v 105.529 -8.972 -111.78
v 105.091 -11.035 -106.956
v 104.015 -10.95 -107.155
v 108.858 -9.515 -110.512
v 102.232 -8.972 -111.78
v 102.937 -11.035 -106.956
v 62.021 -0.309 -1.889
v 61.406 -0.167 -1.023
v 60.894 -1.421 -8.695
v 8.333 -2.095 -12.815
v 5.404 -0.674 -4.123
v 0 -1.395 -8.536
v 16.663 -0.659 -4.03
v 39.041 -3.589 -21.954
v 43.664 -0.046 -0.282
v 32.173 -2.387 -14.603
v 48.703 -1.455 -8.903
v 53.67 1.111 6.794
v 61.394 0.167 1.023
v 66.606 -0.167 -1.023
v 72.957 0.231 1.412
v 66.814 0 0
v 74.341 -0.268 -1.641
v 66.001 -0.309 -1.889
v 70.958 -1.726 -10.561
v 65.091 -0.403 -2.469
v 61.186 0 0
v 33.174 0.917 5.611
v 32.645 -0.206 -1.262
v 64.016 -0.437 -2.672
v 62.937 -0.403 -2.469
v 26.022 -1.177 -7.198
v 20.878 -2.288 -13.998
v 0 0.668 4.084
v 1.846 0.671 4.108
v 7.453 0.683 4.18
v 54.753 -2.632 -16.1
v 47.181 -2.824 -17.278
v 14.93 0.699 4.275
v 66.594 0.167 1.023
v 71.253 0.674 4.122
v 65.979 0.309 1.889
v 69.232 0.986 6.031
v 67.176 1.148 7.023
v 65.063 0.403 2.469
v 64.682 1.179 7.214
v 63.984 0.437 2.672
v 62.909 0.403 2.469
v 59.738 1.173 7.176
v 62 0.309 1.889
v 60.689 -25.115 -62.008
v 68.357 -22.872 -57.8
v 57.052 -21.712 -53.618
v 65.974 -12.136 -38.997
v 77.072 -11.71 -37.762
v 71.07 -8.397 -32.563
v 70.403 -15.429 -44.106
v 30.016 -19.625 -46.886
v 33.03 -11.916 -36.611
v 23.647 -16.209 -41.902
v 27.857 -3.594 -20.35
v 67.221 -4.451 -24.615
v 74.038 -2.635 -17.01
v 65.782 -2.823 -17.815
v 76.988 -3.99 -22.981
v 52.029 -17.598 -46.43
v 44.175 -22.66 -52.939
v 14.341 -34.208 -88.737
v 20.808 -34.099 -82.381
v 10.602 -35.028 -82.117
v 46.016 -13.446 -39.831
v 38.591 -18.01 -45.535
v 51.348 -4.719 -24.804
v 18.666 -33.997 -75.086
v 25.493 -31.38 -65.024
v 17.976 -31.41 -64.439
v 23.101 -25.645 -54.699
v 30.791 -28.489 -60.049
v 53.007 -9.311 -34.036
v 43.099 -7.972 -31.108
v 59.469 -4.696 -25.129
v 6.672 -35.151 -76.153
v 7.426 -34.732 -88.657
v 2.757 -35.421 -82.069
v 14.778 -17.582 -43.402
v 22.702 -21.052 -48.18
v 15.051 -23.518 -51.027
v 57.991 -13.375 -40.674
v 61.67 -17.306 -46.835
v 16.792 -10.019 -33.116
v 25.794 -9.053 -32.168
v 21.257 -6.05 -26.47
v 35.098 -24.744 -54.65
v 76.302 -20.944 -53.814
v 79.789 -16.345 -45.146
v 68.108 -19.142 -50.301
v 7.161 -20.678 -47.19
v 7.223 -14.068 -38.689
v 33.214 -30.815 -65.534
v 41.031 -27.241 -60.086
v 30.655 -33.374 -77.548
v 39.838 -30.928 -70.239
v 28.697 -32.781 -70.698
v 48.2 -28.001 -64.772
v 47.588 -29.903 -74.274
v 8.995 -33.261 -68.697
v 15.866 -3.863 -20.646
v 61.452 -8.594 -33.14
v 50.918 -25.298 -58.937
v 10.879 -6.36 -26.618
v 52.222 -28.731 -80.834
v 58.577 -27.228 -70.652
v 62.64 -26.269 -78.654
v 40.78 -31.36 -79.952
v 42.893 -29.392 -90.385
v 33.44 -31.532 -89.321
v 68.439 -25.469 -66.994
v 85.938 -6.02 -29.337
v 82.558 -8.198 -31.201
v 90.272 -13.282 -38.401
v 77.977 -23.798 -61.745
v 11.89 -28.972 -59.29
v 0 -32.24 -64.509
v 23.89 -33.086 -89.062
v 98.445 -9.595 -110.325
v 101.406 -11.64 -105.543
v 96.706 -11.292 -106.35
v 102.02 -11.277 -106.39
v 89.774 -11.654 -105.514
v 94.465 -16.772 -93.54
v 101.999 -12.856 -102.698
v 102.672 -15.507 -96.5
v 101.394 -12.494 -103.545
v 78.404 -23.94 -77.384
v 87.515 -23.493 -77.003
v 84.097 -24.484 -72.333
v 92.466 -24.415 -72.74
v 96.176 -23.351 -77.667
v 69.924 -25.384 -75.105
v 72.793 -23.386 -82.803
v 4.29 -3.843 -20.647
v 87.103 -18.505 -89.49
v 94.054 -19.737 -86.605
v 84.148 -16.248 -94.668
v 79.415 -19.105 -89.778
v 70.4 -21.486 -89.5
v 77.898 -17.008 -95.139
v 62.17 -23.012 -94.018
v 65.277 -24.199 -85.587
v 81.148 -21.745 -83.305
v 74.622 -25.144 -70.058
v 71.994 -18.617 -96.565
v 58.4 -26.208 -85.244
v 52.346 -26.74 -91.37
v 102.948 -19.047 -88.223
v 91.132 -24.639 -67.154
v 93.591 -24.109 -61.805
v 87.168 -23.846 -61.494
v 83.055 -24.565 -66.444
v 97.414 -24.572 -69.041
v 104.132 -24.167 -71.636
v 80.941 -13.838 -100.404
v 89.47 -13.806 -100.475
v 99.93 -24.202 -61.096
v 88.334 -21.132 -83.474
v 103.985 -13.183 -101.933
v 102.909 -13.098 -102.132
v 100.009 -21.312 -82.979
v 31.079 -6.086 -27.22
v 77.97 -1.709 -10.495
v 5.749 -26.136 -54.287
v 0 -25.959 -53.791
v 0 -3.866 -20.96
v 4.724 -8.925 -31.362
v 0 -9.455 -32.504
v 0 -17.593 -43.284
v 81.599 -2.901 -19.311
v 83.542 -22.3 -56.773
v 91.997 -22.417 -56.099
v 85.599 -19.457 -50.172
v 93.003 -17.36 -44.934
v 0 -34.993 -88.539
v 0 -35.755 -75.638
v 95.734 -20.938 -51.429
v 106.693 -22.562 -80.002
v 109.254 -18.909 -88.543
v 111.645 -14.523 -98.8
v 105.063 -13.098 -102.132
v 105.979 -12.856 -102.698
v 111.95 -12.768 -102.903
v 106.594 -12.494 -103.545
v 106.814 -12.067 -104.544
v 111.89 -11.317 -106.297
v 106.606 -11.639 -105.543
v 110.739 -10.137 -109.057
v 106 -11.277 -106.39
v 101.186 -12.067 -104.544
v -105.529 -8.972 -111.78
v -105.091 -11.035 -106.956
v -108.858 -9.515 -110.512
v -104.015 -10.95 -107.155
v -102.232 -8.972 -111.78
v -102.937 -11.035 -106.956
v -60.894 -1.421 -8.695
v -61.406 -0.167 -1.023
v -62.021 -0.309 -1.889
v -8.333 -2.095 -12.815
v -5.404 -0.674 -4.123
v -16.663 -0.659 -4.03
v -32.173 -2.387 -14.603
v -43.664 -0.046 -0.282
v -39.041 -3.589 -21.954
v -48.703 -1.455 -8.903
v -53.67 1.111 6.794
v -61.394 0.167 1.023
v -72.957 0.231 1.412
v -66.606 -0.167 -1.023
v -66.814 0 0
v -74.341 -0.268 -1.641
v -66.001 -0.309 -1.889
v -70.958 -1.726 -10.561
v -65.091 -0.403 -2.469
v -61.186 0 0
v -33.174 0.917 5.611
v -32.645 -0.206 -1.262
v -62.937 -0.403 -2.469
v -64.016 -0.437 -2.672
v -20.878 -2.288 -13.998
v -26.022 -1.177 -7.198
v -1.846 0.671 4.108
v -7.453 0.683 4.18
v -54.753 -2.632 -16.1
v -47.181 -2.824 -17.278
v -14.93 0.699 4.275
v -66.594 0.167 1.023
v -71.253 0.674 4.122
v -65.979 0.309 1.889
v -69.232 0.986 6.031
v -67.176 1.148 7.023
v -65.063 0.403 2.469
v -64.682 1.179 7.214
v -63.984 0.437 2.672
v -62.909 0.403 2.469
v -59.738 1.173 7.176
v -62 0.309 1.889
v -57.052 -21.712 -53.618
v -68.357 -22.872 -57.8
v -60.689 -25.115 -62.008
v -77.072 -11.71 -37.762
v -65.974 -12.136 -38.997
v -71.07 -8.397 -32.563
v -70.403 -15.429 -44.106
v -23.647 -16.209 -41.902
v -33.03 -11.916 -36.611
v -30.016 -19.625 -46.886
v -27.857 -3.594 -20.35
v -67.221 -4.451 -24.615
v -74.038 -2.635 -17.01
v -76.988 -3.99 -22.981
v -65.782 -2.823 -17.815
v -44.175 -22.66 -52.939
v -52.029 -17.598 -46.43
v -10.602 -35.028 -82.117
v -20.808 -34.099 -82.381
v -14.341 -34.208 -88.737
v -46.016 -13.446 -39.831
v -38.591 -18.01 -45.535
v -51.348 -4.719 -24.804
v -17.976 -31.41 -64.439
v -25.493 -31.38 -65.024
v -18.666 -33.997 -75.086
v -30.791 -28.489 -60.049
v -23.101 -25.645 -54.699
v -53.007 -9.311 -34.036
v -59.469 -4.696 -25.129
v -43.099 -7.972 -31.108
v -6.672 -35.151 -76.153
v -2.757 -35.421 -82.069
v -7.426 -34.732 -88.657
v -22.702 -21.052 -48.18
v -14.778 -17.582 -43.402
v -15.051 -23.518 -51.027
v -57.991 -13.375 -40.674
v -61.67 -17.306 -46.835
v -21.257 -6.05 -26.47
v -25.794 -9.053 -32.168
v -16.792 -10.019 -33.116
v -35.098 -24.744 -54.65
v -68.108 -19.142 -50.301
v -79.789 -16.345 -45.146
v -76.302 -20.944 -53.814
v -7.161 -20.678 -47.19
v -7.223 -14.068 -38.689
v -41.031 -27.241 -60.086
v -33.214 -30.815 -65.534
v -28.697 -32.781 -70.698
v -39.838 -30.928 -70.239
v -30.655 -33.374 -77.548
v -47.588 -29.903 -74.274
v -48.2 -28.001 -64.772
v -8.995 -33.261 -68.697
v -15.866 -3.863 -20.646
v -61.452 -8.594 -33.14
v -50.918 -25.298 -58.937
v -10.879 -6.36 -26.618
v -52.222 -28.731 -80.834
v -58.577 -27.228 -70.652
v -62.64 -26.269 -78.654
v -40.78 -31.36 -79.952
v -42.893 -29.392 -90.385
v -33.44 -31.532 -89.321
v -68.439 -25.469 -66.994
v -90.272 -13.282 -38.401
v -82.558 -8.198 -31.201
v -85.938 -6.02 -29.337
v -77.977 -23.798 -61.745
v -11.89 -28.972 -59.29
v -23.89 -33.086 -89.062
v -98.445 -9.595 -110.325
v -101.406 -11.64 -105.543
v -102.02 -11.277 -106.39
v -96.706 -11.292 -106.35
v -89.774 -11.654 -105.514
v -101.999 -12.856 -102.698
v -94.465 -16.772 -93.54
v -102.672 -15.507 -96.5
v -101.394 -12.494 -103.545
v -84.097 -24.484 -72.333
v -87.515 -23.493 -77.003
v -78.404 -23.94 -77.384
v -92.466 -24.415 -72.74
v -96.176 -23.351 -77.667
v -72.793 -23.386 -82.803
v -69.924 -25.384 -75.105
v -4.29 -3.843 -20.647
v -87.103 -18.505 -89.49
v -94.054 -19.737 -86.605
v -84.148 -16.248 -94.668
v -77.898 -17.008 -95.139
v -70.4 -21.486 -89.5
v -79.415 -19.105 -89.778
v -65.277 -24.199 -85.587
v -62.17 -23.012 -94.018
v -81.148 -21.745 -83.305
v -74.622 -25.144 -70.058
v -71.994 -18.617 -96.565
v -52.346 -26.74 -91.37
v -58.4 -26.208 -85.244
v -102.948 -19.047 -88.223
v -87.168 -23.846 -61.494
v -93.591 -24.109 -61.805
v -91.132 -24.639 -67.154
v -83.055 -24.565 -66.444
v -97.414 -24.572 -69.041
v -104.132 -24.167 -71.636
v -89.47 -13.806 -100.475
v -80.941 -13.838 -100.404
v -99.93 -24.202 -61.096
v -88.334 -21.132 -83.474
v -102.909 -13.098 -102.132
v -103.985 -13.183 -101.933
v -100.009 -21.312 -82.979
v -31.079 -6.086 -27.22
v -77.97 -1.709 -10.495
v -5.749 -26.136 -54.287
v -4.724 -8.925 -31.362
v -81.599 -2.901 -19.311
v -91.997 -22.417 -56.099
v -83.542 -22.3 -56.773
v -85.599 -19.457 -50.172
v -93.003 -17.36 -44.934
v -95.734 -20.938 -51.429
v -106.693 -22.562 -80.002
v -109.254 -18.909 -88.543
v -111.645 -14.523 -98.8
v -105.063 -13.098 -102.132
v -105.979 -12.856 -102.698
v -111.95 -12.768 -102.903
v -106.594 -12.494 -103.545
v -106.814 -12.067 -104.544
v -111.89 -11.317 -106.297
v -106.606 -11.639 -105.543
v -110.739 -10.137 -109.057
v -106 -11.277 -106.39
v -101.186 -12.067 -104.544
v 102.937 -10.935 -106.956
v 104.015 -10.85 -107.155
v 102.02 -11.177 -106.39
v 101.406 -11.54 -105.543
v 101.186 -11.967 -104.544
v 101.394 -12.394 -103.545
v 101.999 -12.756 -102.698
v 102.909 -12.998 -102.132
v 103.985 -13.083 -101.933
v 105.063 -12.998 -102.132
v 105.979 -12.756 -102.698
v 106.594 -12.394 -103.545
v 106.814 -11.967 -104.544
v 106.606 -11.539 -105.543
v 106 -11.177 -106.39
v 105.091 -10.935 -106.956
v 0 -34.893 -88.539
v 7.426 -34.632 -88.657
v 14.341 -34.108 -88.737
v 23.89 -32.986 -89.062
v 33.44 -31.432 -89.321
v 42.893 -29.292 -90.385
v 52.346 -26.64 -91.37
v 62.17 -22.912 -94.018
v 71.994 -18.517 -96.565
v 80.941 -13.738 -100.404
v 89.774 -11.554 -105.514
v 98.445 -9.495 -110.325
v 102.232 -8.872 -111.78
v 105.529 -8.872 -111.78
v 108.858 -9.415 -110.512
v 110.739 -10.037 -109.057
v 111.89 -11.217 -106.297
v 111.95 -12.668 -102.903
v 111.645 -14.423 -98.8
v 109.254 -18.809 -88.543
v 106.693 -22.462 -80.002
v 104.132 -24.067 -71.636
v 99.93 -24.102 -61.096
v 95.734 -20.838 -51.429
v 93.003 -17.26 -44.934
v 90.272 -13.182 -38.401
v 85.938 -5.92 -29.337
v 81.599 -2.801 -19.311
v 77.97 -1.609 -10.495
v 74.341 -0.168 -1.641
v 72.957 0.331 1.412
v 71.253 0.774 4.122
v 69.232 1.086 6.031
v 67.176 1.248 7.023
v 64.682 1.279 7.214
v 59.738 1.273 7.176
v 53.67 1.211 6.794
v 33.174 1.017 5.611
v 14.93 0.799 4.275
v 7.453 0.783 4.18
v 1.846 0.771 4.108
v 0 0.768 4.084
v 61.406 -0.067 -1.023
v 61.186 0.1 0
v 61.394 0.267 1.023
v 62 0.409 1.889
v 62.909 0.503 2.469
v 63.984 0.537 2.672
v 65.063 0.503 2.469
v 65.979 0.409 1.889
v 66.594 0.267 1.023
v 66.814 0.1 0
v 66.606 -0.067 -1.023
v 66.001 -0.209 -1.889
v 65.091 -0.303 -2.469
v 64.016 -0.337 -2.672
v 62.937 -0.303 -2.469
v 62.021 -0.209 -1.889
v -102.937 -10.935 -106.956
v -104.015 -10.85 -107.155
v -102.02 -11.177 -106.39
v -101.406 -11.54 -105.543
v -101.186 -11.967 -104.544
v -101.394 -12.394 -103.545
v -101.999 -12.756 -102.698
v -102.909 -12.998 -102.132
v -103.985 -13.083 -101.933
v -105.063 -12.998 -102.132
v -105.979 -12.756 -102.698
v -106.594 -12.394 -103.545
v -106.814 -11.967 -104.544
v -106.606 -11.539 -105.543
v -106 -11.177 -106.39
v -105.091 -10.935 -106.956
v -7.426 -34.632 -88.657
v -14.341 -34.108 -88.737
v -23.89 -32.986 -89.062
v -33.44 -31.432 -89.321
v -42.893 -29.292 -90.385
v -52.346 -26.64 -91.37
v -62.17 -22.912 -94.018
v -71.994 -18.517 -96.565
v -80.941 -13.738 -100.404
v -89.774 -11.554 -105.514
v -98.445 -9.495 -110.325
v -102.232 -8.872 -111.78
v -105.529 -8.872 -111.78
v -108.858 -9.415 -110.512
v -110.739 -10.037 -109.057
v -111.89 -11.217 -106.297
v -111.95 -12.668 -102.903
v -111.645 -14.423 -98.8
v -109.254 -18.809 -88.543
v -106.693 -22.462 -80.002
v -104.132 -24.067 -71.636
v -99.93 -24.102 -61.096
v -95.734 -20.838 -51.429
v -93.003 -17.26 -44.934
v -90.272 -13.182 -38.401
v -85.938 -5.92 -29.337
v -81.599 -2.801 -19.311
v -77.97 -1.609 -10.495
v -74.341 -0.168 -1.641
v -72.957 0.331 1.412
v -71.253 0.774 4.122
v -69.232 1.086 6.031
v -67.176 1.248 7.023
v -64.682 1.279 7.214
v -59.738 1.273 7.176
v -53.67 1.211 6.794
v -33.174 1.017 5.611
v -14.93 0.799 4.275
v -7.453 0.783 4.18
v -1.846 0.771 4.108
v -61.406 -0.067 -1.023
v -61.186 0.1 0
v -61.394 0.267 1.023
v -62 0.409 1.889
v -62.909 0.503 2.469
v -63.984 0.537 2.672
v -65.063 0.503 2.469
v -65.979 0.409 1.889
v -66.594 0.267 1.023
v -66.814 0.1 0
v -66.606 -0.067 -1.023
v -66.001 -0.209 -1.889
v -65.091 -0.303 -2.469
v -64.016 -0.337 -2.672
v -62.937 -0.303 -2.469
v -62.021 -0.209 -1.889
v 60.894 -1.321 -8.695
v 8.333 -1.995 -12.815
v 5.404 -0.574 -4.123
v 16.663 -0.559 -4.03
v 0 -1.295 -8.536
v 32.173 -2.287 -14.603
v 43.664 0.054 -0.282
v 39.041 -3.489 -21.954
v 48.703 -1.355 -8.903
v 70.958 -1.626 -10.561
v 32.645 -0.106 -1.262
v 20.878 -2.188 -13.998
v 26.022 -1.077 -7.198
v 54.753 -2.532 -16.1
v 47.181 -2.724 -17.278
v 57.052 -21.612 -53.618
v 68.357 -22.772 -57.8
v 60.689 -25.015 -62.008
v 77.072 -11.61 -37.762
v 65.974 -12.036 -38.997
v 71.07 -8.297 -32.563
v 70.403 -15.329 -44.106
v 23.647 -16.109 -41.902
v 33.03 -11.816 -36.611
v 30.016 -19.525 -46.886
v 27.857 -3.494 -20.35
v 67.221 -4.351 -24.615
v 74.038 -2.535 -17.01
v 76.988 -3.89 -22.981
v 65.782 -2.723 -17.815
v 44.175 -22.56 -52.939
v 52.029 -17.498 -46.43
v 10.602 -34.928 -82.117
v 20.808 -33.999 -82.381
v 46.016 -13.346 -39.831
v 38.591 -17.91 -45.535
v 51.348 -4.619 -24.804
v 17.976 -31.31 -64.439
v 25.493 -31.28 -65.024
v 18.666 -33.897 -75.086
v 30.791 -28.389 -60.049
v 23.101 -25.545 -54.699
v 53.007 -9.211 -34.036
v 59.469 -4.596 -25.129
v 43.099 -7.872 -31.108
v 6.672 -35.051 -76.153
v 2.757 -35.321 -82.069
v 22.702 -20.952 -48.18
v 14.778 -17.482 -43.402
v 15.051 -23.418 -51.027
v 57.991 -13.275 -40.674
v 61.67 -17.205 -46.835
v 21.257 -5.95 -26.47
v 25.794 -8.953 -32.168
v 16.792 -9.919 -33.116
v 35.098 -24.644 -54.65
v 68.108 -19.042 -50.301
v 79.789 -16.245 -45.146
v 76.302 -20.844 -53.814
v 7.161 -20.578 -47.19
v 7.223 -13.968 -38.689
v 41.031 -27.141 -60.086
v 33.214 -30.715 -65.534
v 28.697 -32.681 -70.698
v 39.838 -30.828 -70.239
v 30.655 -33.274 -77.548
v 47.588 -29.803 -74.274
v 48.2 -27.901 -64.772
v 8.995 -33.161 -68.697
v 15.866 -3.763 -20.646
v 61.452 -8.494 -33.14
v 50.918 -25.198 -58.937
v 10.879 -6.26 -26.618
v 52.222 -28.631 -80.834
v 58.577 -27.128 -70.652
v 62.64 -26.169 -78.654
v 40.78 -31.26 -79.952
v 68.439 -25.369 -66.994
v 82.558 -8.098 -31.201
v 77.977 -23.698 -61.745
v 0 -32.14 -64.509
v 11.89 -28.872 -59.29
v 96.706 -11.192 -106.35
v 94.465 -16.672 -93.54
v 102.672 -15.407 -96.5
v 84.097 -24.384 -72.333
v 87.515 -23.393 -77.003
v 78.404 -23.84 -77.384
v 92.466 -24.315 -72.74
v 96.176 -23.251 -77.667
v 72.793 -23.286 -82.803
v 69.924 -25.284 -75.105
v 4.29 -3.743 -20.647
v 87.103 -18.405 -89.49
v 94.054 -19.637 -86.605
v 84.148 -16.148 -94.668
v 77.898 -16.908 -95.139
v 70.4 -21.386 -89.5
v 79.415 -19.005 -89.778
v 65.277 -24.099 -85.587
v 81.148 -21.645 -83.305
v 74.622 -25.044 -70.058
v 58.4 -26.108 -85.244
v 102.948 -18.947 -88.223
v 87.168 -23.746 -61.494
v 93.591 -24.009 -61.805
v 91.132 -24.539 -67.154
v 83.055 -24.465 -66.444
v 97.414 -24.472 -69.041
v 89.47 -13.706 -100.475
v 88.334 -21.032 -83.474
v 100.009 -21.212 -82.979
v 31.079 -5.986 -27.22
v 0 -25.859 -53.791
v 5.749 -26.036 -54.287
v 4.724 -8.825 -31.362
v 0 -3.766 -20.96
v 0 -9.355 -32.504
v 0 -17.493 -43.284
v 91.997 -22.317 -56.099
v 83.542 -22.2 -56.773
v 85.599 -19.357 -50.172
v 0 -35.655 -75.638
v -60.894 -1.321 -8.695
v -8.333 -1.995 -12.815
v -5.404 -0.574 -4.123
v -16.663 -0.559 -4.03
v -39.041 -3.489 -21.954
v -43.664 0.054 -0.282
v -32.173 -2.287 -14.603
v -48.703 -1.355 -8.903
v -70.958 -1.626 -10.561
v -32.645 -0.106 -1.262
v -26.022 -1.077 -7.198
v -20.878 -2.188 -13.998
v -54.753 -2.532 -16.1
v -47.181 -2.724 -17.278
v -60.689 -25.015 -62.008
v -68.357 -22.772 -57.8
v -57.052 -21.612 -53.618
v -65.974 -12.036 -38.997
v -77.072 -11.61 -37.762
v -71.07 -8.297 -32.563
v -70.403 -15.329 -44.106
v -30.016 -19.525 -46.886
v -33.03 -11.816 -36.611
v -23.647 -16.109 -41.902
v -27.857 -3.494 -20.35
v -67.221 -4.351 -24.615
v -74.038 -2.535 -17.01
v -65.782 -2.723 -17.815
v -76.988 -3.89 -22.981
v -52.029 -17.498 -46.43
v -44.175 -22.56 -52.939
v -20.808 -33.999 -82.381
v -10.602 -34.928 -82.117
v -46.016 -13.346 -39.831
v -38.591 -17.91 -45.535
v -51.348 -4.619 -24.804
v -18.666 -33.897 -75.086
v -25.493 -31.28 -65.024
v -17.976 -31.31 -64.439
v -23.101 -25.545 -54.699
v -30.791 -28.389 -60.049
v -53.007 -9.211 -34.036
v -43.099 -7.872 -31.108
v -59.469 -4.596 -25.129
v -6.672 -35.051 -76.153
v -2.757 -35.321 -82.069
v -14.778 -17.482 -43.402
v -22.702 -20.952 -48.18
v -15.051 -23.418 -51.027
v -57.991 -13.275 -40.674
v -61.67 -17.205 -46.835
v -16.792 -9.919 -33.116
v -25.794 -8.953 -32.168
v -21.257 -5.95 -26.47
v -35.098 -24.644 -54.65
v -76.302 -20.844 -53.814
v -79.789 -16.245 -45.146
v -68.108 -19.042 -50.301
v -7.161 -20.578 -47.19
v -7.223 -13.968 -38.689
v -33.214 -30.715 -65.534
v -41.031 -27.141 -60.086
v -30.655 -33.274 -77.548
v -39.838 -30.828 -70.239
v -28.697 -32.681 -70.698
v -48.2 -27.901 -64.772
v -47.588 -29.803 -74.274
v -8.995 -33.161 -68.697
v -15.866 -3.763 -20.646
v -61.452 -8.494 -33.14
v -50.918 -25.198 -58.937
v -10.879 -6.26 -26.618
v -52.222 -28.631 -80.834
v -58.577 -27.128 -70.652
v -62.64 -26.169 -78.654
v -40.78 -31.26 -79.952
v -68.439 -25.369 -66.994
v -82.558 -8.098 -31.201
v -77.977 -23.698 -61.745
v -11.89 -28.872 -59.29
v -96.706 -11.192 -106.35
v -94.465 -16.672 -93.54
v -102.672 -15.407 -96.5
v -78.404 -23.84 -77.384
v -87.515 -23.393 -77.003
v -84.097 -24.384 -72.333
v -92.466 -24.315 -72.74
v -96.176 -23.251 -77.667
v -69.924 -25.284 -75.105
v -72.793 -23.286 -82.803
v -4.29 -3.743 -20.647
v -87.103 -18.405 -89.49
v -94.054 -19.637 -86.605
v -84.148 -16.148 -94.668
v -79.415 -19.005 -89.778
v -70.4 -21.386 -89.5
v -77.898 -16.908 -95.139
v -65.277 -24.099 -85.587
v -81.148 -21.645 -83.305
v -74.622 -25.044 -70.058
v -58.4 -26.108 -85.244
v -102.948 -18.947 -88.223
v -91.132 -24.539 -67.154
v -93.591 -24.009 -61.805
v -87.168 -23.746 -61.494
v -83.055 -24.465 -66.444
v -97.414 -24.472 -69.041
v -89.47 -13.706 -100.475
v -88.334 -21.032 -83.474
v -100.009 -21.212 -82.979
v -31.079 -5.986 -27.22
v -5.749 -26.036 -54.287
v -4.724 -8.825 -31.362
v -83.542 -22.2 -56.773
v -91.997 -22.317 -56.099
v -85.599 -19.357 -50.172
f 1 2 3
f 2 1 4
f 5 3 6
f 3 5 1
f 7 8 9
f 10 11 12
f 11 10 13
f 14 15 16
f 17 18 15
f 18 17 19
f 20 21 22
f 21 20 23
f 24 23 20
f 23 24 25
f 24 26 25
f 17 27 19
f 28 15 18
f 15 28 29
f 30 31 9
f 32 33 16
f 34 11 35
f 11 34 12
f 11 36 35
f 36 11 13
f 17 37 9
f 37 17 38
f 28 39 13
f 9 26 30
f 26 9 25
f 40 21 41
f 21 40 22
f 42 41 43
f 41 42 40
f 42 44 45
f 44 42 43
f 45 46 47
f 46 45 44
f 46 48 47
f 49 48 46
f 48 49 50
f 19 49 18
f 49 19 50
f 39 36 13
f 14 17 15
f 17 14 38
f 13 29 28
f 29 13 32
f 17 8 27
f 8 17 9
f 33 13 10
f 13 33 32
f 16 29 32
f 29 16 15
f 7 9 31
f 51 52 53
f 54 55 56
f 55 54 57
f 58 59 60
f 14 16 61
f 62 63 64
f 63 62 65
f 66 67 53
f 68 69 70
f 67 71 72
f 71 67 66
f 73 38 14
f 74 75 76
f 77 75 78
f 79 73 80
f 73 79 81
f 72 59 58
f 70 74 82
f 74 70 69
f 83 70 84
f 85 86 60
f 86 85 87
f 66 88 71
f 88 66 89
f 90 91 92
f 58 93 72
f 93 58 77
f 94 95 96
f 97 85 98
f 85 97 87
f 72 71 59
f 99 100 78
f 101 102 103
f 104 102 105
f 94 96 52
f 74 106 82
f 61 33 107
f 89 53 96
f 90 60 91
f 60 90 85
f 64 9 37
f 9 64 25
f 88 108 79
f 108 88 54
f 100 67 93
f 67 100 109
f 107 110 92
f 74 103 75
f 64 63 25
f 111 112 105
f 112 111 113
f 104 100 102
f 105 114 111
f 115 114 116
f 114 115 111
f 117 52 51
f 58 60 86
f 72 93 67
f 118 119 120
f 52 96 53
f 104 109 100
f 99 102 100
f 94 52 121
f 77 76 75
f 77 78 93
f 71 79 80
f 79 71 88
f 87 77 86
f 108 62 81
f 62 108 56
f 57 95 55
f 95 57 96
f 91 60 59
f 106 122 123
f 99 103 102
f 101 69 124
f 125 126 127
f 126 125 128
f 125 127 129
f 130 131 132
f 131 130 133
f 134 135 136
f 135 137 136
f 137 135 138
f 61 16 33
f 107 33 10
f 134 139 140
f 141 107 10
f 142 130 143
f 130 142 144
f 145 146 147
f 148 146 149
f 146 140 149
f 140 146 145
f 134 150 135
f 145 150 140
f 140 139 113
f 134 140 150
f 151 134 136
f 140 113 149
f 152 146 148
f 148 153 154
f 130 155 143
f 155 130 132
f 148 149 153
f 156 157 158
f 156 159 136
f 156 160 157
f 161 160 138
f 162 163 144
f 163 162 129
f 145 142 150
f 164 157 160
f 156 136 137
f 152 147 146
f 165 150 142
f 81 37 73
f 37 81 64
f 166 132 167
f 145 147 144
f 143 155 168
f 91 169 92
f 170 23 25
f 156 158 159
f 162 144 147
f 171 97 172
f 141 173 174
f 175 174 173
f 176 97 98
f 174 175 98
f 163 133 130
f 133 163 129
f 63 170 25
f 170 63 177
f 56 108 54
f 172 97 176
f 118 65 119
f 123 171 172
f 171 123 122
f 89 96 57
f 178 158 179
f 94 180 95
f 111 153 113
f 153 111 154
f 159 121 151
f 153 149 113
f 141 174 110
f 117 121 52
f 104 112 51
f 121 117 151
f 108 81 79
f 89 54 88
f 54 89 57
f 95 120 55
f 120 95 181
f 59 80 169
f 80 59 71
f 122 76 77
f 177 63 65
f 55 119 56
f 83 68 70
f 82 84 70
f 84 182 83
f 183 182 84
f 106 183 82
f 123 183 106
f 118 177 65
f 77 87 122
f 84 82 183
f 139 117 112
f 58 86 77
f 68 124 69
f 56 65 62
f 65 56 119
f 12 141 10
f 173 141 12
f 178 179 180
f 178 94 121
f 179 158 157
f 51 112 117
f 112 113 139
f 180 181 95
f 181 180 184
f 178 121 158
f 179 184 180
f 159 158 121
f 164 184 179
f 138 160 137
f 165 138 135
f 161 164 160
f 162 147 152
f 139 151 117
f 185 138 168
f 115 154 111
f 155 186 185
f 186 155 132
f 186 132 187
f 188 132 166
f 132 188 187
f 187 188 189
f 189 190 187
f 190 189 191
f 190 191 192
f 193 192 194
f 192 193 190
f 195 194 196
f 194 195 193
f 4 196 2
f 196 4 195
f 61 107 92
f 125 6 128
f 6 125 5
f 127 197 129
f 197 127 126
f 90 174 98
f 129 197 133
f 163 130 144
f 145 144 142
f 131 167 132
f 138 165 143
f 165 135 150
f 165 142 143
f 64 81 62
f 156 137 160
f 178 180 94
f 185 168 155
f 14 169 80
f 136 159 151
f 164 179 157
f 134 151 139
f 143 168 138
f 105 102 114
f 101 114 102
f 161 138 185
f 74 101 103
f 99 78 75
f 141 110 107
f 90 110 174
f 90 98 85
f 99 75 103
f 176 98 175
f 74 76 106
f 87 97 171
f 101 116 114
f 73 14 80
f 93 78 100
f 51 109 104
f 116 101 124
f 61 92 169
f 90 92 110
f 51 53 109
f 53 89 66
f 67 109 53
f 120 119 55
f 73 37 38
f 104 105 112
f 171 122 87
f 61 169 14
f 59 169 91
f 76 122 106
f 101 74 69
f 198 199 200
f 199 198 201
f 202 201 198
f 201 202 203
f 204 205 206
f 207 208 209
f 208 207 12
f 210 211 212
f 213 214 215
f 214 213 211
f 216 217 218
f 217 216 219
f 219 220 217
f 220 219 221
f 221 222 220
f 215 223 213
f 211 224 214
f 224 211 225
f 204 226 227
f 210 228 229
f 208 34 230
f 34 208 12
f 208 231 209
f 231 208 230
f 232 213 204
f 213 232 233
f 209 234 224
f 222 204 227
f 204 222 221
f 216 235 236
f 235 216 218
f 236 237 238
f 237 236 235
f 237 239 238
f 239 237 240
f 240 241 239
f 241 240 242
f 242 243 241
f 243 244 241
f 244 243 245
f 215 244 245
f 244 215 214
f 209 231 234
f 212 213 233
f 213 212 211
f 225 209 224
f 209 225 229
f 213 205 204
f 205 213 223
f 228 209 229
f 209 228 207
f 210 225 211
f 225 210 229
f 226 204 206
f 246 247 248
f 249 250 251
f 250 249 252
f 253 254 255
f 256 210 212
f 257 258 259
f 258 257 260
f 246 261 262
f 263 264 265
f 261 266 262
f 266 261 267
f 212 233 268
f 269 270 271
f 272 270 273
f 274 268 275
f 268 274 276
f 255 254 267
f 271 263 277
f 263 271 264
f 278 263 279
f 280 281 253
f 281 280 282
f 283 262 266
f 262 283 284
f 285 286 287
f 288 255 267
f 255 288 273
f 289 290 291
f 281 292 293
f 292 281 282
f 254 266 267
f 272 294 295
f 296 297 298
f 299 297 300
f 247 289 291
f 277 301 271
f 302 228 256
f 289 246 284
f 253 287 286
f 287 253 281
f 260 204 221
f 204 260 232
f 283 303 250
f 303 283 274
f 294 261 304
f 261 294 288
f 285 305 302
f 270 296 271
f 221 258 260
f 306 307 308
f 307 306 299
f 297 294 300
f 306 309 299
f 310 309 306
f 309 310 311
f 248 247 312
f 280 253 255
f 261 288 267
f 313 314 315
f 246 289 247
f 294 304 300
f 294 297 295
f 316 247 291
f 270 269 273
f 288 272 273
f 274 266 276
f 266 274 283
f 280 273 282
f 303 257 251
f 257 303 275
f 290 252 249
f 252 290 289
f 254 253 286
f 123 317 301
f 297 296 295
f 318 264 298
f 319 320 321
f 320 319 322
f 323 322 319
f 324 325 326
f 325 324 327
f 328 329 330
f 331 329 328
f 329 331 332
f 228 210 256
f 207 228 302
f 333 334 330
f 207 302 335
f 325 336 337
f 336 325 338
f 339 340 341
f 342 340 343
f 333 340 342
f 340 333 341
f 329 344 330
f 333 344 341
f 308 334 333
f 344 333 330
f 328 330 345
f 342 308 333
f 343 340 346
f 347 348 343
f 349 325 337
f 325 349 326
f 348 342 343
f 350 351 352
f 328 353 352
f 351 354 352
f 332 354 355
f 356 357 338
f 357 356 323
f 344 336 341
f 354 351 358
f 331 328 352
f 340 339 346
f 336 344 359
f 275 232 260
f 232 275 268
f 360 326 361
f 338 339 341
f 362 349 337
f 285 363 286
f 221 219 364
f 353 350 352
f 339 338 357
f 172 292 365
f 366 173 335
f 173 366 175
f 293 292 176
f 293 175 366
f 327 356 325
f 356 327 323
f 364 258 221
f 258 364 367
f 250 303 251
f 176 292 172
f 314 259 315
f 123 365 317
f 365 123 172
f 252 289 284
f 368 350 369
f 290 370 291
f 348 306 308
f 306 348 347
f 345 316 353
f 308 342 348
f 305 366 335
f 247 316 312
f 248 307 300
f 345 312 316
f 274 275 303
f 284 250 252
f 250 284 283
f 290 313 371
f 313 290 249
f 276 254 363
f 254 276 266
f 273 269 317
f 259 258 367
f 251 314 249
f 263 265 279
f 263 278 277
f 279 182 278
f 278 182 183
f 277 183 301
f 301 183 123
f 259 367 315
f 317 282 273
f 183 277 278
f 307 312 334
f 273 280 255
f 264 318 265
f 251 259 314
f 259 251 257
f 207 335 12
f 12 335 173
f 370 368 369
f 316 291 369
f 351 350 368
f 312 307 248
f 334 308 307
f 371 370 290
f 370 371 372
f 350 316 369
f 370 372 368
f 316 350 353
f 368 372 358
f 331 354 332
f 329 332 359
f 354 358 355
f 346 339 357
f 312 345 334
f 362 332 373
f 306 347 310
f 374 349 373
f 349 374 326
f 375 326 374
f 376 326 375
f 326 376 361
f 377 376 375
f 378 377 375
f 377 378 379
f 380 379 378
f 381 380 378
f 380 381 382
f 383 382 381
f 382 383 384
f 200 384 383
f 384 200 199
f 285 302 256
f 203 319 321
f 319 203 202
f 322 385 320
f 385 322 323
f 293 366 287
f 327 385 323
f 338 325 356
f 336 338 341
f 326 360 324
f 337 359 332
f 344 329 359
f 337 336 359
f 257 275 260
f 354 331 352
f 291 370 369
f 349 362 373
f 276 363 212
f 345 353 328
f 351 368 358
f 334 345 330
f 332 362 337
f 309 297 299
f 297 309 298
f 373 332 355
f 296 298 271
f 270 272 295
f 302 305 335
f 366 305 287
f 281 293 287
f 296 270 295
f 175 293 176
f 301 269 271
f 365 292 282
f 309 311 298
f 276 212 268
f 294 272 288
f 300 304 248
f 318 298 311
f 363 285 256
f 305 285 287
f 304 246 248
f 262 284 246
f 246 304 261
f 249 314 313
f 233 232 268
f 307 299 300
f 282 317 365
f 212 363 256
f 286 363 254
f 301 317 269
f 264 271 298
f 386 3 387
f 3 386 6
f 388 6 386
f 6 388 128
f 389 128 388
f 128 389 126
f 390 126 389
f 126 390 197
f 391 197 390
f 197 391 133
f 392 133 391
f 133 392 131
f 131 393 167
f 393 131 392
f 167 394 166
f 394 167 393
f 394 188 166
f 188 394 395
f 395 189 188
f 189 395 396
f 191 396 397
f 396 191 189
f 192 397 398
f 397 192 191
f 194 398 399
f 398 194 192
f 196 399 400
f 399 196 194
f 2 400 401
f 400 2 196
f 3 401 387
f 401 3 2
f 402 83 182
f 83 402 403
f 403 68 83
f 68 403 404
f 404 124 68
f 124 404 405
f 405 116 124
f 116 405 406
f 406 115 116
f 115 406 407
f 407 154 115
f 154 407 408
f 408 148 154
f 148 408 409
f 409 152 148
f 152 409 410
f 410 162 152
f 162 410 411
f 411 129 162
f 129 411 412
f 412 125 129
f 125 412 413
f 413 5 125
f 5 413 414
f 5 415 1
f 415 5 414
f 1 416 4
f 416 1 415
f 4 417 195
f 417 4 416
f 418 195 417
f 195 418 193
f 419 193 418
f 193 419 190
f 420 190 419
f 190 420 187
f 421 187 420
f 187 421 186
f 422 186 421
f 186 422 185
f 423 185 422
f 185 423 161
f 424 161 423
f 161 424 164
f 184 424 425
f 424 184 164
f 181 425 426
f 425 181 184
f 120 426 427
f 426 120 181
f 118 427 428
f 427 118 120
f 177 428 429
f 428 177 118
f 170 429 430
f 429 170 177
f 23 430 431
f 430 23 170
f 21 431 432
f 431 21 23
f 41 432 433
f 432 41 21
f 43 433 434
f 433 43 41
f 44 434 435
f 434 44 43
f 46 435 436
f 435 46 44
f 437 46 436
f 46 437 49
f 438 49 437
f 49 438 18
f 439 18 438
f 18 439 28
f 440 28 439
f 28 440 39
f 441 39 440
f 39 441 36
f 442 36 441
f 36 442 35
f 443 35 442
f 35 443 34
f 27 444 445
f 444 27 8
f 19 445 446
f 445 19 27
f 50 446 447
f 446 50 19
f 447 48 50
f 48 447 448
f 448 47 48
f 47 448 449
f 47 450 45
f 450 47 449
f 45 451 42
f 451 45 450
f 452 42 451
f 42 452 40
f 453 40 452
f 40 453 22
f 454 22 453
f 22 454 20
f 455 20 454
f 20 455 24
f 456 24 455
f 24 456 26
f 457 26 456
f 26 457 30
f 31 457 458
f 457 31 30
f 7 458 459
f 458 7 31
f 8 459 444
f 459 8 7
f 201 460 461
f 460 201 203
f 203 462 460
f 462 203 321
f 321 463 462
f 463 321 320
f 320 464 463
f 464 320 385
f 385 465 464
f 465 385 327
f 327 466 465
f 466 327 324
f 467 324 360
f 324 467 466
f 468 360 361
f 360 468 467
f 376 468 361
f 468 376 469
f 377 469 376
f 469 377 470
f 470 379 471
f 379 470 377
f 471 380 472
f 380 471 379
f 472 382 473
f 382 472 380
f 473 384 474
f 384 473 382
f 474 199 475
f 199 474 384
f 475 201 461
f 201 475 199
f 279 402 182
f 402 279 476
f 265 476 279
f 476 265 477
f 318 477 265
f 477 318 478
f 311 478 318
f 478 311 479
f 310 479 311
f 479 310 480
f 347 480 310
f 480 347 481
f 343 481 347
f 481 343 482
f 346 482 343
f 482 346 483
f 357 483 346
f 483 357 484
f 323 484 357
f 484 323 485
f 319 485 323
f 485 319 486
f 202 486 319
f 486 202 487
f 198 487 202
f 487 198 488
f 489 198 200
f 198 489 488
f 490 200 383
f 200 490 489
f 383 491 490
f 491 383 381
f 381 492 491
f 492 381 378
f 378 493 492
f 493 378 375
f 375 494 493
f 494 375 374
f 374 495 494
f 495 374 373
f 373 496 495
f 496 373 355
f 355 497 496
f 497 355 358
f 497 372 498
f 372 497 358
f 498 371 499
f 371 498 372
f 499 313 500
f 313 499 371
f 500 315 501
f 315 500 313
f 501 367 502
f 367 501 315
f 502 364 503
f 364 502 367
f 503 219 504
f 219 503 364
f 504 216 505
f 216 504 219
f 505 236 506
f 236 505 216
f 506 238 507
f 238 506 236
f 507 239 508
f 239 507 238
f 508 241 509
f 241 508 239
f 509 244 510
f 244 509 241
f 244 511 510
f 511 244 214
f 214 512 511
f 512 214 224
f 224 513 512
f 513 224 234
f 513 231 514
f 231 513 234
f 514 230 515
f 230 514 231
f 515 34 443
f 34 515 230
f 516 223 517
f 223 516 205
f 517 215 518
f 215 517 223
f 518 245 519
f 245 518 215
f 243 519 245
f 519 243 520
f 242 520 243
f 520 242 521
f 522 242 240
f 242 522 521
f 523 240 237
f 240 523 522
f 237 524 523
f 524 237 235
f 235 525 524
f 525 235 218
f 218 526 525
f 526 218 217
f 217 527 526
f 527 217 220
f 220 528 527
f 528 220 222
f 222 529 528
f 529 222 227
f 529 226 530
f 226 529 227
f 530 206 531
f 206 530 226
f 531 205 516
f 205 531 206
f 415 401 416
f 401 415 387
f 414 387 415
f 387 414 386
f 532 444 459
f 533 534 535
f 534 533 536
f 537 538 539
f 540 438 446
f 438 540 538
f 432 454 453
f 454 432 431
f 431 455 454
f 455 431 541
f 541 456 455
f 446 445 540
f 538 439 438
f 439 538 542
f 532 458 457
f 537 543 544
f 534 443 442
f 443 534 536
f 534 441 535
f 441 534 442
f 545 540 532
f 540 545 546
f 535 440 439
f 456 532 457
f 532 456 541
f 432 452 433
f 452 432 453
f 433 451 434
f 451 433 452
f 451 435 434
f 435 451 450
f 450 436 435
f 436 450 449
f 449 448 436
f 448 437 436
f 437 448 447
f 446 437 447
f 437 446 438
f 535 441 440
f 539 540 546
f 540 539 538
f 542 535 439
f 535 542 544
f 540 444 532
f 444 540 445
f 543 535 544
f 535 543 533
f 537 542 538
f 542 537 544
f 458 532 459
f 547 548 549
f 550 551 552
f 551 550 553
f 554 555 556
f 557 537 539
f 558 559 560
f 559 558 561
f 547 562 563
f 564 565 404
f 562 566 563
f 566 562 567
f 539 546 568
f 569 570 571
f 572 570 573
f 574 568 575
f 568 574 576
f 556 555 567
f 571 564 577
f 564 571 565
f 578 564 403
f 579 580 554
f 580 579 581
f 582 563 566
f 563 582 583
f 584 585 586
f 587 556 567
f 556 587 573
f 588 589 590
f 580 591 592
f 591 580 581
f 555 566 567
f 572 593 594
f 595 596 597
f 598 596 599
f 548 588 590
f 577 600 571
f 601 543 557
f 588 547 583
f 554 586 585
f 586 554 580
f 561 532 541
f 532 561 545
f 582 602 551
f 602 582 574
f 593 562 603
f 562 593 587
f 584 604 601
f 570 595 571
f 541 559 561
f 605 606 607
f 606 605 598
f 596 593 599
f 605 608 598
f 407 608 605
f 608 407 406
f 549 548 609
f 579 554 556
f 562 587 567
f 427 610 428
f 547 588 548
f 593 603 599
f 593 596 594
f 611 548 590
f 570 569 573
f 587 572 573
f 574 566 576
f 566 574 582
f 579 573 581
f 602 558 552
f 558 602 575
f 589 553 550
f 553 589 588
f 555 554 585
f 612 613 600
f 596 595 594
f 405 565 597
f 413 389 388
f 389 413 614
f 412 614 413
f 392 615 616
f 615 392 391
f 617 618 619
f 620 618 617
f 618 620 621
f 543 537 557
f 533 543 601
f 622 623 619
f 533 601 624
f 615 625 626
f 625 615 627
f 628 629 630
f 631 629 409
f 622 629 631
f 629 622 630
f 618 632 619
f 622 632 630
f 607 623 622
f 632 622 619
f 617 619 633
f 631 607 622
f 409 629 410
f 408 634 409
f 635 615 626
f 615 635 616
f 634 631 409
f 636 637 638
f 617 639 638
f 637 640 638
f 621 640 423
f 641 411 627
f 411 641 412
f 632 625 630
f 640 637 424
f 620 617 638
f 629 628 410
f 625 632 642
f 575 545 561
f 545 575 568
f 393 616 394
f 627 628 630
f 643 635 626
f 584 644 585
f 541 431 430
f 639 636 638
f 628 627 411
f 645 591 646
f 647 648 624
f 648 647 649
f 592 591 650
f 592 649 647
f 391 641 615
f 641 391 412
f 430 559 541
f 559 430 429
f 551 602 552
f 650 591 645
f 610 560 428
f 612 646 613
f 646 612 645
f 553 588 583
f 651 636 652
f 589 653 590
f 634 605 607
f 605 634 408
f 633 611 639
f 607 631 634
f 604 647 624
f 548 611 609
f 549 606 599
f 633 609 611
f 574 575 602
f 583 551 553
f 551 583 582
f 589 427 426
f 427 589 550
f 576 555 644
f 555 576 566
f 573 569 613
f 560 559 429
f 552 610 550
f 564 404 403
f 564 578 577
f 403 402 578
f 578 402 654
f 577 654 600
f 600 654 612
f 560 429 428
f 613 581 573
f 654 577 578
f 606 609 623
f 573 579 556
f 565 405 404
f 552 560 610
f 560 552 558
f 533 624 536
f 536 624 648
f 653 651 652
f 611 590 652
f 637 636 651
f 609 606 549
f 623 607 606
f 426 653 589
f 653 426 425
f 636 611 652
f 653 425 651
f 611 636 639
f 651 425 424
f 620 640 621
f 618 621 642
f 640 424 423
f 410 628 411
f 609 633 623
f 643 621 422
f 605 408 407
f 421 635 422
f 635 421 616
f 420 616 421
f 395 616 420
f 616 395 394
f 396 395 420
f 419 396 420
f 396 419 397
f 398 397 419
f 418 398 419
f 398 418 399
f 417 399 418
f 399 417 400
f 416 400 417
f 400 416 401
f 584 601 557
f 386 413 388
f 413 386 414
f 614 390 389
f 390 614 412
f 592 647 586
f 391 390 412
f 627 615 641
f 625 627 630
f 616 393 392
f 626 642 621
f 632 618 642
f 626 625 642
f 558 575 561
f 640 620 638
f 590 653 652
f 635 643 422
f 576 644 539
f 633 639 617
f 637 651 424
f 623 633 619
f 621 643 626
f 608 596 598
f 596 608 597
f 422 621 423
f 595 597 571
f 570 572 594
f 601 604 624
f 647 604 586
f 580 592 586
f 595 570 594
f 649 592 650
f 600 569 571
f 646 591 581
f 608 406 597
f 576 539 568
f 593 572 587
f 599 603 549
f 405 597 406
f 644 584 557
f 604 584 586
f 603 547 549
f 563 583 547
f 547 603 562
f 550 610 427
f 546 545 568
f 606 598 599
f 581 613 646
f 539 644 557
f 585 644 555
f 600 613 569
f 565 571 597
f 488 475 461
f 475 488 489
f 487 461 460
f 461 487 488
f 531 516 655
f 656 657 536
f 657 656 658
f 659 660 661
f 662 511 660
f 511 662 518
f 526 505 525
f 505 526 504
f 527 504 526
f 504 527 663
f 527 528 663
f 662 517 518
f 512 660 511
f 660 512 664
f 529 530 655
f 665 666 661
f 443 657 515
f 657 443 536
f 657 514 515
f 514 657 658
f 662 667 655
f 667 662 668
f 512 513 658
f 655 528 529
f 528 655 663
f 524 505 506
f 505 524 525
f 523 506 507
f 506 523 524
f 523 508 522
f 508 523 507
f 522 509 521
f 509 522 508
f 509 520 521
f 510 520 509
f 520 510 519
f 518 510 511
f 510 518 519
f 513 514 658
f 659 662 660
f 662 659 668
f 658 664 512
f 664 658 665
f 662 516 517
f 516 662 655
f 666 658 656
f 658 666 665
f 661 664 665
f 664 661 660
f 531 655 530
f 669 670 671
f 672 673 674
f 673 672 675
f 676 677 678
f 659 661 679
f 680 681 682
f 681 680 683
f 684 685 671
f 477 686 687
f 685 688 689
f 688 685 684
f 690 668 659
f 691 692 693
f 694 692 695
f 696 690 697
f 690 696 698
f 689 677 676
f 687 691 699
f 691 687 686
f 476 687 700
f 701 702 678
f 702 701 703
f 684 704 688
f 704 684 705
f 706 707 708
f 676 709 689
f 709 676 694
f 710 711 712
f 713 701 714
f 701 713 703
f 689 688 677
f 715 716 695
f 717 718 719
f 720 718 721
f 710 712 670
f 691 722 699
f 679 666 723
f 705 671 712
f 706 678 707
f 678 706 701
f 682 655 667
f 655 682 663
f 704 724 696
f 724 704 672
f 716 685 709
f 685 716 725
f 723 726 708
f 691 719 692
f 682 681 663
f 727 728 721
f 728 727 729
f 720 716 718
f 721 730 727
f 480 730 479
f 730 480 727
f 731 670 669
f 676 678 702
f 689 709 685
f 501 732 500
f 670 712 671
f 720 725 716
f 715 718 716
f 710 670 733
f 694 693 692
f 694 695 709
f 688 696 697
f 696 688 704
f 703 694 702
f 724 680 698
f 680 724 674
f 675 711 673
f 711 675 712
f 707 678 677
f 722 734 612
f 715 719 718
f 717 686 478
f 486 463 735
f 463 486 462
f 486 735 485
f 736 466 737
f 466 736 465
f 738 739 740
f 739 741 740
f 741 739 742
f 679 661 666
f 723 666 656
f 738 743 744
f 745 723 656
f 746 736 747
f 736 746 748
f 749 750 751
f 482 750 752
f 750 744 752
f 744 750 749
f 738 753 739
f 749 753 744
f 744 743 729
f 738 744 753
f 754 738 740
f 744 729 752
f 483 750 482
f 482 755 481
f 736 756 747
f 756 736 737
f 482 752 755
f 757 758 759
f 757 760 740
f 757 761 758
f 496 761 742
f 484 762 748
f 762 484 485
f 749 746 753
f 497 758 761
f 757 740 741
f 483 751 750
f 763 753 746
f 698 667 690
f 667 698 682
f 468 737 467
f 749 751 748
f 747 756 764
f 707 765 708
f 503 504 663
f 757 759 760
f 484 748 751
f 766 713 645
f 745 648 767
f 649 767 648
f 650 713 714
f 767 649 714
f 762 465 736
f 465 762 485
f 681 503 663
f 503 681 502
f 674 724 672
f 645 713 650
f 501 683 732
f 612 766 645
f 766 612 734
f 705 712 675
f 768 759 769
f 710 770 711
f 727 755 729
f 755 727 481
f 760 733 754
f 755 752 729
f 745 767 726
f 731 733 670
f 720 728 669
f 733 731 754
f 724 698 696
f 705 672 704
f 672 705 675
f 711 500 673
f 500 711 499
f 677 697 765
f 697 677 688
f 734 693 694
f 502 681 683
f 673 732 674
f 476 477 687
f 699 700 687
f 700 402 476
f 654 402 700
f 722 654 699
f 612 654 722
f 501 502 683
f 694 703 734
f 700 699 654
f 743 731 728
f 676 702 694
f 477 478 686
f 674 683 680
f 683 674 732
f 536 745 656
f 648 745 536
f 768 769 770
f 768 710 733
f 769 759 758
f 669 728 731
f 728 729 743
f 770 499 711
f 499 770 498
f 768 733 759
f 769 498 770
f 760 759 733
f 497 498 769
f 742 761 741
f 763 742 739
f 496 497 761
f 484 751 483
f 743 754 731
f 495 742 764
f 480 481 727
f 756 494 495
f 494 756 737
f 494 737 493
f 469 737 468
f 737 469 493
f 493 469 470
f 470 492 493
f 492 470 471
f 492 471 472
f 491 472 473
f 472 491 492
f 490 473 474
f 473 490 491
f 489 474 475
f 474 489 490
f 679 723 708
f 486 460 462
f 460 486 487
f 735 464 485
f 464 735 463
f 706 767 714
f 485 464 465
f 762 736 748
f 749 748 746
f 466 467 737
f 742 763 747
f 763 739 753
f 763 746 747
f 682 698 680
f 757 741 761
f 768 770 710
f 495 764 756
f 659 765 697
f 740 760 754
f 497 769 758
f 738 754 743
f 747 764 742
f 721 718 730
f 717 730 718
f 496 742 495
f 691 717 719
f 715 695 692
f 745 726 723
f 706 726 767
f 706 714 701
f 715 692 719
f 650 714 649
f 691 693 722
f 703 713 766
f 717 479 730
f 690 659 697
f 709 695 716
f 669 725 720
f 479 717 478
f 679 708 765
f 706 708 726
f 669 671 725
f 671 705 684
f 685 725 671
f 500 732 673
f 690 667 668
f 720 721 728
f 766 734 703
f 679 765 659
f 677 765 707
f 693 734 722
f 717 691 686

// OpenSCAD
use <../lib.scad>
use <s/64991c01s01.scad>
use <s/64991c01s02.scad>
$fa=1; $fs=0.2;
function ldraw_lib__64991c01(realsolid=false) = [
// 0 Sheet Fabric 28 x 17 Trapezoidal Sail (Formed Shape 1)
// 0 Name: 64991c01.dat
// 0 Author: Philippe Hurbain [Philo]
// 0 !LDRAW_ORG Part UPDATE 2020-02
// 0 !LICENSE Licensed under CC BY 2.0 and CC BY 4.0 : see CAreadme.txt
// 
// 0 !HELP Shaped for 4184 The Black Pearl
// 0 !HELP Center mast, middle sail
// 
// 0 BFC CERTIFY CCW
  [0,"BFC","CERTIFY"],
  [0,"BFC","CCW"],
// 
// 0 !CATEGORY Sheet Fabric
// 0 !KEYWORDS Black Pearl, set 4184
// 
// 0 !HISTORY 2014-12-23 [PTadmin] Official Update 2014-02
// 0 !HISTORY 2019-01-25 [cwdee] Update category
// 0 !HISTORY 2019-06-28 [PTadmin] Official Update 2019-01
// 0 !HISTORY 2020-06-10 [cwdee] Update description
// 0 !HISTORY 2020-09-05 [PTadmin] Official Update 2020-02
// 
// 
// 1 16 0 0 0 1 0 0 0 0.99 0 0 0.085 1 s\64991c01s01.dat
  [1,16,0,0,0,1,0,0,0,0.99,0,0,0.085,1, ldraw_lib__s__64991c01s01(realsolid)],
// 1 16 0 0 0 -1 0 0 0 0.99 0 0 0.085 1 s\64991c01s01.dat
  [1,16,0,0,0,-1,0,0,0,0.99,0,0,0.085,1, ldraw_lib__s__64991c01s01(realsolid)],
// 1 16 0 0 0 1 0 0 0 0.99 0 0 0.085 1 s\64991c01s02.dat
  [1,16,0,0,0,1,0,0,0,0.99,0,0,0.085,1, ldraw_lib__s__64991c01s02(realsolid)],
// 1 16 0 0 0 -1 0 0 0 0.99 0 0 0.085 1 s\64991c01s02.dat
  [1,16,0,0,0,-1,0,0,0,0.99,0,0,0.085,1, ldraw_lib__s__64991c01s02(realsolid)],
// 0 BFC INVERTNEXT
  [0,"BFC","INVERTNEXT"],
// 1 16 0 0 0.25 1 0 0 0 0.99 0 0 0.085 1 s\64991c01s01.dat
  [1,16,0,0,0.25,1,0,0,0,0.99,0,0,0.085,1, ldraw_lib__s__64991c01s01(realsolid)],
// 0 BFC INVERTNEXT
  [0,"BFC","INVERTNEXT"],
// 1 16 0 0 0.25 -1 0 0 0 0.99 0 0 0.085 1 s\64991c01s01.dat
  [1,16,0,0,0.25,-1,0,0,0,0.99,0,0,0.085,1, ldraw_lib__s__64991c01s01(realsolid)],
];
module ldraw_lib__64991c01(step=0, col=false, unit=2/5, alt=false, line=0.2, solid=!$preview)
    makepoly(ldraw_lib__64991c01(solid), step=step, col=col, unit=unit, alt=alt, line=line, solid=solid);
ldraw_lib__64991c01(line=0.2);
